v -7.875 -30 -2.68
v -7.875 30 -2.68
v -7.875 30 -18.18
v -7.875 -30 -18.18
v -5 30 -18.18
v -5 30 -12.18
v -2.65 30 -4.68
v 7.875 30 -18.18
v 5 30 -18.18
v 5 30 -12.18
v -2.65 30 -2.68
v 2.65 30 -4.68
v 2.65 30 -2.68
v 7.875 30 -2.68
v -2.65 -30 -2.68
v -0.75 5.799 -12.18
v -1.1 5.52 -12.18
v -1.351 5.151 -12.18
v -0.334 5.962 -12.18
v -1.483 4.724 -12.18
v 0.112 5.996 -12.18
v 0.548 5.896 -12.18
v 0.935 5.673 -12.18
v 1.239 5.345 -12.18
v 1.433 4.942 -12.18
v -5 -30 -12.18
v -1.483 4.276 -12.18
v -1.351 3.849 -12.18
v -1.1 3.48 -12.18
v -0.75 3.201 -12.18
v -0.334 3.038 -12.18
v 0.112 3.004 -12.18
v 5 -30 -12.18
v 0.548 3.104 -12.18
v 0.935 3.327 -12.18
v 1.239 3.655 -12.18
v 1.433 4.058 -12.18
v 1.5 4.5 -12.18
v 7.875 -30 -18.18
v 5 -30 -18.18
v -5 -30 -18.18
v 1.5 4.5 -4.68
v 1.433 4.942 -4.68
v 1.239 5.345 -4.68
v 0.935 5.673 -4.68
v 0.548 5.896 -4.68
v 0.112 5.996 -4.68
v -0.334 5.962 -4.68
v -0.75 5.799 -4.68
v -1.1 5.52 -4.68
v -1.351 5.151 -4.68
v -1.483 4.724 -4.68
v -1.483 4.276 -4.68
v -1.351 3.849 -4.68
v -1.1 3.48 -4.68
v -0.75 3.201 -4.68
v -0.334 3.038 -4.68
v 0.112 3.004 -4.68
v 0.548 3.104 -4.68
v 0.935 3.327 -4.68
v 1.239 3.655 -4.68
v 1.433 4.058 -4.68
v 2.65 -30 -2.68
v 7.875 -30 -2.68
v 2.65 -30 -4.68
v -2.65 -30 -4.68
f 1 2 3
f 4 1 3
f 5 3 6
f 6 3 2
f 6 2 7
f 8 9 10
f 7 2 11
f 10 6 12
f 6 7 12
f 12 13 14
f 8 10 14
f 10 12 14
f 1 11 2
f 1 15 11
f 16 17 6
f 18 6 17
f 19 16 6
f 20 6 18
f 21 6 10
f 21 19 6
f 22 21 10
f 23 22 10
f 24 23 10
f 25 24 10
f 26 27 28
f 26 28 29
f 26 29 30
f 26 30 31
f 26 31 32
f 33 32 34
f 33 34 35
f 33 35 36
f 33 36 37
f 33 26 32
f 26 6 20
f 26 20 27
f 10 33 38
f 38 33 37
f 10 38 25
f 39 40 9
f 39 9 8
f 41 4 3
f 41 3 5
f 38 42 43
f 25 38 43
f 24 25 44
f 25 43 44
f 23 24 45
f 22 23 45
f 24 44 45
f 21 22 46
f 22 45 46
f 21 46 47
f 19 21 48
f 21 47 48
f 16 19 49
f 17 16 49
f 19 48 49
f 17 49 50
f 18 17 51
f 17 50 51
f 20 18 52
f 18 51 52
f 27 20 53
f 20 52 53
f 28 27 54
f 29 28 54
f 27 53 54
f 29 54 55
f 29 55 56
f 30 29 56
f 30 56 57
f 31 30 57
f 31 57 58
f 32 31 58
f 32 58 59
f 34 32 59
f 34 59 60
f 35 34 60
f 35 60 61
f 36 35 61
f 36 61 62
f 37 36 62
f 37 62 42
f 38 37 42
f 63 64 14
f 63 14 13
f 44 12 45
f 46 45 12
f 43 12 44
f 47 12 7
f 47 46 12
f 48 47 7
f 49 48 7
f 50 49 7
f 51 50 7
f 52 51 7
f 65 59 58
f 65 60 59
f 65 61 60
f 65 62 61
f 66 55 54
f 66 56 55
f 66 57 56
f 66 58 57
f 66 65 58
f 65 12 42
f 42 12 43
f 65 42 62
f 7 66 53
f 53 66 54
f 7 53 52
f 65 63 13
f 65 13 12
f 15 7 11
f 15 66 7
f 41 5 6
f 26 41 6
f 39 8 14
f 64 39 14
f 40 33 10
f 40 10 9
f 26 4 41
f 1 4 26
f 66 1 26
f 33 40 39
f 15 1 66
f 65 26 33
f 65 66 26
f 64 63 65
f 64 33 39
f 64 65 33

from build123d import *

# Parameters (mm, degrees)
F1_DEPTH = 30
F2_R     = 1.5
F3_DEPTH = 25


with BuildPart() as f1:
    # F0 (on Front) → F1 (new body, symmetric)
    with BuildSketch(Plane.XZ):
        Polygon((-7.875, -2.679542), (-7.875, -18.179542), (-5, -18.179542), (-5, -12.179542), (5, -12.179542), (5, -18.179542), (7.875, -18.179542), (7.875, -2.679542), (2.65, -2.679542), (2.65, -4.679542), (-2.65, -4.679542), (-2.65, -2.679542), align=None)
    extrude(amount=F1_DEPTH, both=True)

    # F2 (on face) → F3 (cut)
    with BuildSketch(Plane.XY.offset(-4.679542)):
        with Locations((0, 4.5)):
            Circle(F2_R)
    extrude(amount=-F3_DEPTH, mode=Mode.SUBTRACT)


solid = f1.part
